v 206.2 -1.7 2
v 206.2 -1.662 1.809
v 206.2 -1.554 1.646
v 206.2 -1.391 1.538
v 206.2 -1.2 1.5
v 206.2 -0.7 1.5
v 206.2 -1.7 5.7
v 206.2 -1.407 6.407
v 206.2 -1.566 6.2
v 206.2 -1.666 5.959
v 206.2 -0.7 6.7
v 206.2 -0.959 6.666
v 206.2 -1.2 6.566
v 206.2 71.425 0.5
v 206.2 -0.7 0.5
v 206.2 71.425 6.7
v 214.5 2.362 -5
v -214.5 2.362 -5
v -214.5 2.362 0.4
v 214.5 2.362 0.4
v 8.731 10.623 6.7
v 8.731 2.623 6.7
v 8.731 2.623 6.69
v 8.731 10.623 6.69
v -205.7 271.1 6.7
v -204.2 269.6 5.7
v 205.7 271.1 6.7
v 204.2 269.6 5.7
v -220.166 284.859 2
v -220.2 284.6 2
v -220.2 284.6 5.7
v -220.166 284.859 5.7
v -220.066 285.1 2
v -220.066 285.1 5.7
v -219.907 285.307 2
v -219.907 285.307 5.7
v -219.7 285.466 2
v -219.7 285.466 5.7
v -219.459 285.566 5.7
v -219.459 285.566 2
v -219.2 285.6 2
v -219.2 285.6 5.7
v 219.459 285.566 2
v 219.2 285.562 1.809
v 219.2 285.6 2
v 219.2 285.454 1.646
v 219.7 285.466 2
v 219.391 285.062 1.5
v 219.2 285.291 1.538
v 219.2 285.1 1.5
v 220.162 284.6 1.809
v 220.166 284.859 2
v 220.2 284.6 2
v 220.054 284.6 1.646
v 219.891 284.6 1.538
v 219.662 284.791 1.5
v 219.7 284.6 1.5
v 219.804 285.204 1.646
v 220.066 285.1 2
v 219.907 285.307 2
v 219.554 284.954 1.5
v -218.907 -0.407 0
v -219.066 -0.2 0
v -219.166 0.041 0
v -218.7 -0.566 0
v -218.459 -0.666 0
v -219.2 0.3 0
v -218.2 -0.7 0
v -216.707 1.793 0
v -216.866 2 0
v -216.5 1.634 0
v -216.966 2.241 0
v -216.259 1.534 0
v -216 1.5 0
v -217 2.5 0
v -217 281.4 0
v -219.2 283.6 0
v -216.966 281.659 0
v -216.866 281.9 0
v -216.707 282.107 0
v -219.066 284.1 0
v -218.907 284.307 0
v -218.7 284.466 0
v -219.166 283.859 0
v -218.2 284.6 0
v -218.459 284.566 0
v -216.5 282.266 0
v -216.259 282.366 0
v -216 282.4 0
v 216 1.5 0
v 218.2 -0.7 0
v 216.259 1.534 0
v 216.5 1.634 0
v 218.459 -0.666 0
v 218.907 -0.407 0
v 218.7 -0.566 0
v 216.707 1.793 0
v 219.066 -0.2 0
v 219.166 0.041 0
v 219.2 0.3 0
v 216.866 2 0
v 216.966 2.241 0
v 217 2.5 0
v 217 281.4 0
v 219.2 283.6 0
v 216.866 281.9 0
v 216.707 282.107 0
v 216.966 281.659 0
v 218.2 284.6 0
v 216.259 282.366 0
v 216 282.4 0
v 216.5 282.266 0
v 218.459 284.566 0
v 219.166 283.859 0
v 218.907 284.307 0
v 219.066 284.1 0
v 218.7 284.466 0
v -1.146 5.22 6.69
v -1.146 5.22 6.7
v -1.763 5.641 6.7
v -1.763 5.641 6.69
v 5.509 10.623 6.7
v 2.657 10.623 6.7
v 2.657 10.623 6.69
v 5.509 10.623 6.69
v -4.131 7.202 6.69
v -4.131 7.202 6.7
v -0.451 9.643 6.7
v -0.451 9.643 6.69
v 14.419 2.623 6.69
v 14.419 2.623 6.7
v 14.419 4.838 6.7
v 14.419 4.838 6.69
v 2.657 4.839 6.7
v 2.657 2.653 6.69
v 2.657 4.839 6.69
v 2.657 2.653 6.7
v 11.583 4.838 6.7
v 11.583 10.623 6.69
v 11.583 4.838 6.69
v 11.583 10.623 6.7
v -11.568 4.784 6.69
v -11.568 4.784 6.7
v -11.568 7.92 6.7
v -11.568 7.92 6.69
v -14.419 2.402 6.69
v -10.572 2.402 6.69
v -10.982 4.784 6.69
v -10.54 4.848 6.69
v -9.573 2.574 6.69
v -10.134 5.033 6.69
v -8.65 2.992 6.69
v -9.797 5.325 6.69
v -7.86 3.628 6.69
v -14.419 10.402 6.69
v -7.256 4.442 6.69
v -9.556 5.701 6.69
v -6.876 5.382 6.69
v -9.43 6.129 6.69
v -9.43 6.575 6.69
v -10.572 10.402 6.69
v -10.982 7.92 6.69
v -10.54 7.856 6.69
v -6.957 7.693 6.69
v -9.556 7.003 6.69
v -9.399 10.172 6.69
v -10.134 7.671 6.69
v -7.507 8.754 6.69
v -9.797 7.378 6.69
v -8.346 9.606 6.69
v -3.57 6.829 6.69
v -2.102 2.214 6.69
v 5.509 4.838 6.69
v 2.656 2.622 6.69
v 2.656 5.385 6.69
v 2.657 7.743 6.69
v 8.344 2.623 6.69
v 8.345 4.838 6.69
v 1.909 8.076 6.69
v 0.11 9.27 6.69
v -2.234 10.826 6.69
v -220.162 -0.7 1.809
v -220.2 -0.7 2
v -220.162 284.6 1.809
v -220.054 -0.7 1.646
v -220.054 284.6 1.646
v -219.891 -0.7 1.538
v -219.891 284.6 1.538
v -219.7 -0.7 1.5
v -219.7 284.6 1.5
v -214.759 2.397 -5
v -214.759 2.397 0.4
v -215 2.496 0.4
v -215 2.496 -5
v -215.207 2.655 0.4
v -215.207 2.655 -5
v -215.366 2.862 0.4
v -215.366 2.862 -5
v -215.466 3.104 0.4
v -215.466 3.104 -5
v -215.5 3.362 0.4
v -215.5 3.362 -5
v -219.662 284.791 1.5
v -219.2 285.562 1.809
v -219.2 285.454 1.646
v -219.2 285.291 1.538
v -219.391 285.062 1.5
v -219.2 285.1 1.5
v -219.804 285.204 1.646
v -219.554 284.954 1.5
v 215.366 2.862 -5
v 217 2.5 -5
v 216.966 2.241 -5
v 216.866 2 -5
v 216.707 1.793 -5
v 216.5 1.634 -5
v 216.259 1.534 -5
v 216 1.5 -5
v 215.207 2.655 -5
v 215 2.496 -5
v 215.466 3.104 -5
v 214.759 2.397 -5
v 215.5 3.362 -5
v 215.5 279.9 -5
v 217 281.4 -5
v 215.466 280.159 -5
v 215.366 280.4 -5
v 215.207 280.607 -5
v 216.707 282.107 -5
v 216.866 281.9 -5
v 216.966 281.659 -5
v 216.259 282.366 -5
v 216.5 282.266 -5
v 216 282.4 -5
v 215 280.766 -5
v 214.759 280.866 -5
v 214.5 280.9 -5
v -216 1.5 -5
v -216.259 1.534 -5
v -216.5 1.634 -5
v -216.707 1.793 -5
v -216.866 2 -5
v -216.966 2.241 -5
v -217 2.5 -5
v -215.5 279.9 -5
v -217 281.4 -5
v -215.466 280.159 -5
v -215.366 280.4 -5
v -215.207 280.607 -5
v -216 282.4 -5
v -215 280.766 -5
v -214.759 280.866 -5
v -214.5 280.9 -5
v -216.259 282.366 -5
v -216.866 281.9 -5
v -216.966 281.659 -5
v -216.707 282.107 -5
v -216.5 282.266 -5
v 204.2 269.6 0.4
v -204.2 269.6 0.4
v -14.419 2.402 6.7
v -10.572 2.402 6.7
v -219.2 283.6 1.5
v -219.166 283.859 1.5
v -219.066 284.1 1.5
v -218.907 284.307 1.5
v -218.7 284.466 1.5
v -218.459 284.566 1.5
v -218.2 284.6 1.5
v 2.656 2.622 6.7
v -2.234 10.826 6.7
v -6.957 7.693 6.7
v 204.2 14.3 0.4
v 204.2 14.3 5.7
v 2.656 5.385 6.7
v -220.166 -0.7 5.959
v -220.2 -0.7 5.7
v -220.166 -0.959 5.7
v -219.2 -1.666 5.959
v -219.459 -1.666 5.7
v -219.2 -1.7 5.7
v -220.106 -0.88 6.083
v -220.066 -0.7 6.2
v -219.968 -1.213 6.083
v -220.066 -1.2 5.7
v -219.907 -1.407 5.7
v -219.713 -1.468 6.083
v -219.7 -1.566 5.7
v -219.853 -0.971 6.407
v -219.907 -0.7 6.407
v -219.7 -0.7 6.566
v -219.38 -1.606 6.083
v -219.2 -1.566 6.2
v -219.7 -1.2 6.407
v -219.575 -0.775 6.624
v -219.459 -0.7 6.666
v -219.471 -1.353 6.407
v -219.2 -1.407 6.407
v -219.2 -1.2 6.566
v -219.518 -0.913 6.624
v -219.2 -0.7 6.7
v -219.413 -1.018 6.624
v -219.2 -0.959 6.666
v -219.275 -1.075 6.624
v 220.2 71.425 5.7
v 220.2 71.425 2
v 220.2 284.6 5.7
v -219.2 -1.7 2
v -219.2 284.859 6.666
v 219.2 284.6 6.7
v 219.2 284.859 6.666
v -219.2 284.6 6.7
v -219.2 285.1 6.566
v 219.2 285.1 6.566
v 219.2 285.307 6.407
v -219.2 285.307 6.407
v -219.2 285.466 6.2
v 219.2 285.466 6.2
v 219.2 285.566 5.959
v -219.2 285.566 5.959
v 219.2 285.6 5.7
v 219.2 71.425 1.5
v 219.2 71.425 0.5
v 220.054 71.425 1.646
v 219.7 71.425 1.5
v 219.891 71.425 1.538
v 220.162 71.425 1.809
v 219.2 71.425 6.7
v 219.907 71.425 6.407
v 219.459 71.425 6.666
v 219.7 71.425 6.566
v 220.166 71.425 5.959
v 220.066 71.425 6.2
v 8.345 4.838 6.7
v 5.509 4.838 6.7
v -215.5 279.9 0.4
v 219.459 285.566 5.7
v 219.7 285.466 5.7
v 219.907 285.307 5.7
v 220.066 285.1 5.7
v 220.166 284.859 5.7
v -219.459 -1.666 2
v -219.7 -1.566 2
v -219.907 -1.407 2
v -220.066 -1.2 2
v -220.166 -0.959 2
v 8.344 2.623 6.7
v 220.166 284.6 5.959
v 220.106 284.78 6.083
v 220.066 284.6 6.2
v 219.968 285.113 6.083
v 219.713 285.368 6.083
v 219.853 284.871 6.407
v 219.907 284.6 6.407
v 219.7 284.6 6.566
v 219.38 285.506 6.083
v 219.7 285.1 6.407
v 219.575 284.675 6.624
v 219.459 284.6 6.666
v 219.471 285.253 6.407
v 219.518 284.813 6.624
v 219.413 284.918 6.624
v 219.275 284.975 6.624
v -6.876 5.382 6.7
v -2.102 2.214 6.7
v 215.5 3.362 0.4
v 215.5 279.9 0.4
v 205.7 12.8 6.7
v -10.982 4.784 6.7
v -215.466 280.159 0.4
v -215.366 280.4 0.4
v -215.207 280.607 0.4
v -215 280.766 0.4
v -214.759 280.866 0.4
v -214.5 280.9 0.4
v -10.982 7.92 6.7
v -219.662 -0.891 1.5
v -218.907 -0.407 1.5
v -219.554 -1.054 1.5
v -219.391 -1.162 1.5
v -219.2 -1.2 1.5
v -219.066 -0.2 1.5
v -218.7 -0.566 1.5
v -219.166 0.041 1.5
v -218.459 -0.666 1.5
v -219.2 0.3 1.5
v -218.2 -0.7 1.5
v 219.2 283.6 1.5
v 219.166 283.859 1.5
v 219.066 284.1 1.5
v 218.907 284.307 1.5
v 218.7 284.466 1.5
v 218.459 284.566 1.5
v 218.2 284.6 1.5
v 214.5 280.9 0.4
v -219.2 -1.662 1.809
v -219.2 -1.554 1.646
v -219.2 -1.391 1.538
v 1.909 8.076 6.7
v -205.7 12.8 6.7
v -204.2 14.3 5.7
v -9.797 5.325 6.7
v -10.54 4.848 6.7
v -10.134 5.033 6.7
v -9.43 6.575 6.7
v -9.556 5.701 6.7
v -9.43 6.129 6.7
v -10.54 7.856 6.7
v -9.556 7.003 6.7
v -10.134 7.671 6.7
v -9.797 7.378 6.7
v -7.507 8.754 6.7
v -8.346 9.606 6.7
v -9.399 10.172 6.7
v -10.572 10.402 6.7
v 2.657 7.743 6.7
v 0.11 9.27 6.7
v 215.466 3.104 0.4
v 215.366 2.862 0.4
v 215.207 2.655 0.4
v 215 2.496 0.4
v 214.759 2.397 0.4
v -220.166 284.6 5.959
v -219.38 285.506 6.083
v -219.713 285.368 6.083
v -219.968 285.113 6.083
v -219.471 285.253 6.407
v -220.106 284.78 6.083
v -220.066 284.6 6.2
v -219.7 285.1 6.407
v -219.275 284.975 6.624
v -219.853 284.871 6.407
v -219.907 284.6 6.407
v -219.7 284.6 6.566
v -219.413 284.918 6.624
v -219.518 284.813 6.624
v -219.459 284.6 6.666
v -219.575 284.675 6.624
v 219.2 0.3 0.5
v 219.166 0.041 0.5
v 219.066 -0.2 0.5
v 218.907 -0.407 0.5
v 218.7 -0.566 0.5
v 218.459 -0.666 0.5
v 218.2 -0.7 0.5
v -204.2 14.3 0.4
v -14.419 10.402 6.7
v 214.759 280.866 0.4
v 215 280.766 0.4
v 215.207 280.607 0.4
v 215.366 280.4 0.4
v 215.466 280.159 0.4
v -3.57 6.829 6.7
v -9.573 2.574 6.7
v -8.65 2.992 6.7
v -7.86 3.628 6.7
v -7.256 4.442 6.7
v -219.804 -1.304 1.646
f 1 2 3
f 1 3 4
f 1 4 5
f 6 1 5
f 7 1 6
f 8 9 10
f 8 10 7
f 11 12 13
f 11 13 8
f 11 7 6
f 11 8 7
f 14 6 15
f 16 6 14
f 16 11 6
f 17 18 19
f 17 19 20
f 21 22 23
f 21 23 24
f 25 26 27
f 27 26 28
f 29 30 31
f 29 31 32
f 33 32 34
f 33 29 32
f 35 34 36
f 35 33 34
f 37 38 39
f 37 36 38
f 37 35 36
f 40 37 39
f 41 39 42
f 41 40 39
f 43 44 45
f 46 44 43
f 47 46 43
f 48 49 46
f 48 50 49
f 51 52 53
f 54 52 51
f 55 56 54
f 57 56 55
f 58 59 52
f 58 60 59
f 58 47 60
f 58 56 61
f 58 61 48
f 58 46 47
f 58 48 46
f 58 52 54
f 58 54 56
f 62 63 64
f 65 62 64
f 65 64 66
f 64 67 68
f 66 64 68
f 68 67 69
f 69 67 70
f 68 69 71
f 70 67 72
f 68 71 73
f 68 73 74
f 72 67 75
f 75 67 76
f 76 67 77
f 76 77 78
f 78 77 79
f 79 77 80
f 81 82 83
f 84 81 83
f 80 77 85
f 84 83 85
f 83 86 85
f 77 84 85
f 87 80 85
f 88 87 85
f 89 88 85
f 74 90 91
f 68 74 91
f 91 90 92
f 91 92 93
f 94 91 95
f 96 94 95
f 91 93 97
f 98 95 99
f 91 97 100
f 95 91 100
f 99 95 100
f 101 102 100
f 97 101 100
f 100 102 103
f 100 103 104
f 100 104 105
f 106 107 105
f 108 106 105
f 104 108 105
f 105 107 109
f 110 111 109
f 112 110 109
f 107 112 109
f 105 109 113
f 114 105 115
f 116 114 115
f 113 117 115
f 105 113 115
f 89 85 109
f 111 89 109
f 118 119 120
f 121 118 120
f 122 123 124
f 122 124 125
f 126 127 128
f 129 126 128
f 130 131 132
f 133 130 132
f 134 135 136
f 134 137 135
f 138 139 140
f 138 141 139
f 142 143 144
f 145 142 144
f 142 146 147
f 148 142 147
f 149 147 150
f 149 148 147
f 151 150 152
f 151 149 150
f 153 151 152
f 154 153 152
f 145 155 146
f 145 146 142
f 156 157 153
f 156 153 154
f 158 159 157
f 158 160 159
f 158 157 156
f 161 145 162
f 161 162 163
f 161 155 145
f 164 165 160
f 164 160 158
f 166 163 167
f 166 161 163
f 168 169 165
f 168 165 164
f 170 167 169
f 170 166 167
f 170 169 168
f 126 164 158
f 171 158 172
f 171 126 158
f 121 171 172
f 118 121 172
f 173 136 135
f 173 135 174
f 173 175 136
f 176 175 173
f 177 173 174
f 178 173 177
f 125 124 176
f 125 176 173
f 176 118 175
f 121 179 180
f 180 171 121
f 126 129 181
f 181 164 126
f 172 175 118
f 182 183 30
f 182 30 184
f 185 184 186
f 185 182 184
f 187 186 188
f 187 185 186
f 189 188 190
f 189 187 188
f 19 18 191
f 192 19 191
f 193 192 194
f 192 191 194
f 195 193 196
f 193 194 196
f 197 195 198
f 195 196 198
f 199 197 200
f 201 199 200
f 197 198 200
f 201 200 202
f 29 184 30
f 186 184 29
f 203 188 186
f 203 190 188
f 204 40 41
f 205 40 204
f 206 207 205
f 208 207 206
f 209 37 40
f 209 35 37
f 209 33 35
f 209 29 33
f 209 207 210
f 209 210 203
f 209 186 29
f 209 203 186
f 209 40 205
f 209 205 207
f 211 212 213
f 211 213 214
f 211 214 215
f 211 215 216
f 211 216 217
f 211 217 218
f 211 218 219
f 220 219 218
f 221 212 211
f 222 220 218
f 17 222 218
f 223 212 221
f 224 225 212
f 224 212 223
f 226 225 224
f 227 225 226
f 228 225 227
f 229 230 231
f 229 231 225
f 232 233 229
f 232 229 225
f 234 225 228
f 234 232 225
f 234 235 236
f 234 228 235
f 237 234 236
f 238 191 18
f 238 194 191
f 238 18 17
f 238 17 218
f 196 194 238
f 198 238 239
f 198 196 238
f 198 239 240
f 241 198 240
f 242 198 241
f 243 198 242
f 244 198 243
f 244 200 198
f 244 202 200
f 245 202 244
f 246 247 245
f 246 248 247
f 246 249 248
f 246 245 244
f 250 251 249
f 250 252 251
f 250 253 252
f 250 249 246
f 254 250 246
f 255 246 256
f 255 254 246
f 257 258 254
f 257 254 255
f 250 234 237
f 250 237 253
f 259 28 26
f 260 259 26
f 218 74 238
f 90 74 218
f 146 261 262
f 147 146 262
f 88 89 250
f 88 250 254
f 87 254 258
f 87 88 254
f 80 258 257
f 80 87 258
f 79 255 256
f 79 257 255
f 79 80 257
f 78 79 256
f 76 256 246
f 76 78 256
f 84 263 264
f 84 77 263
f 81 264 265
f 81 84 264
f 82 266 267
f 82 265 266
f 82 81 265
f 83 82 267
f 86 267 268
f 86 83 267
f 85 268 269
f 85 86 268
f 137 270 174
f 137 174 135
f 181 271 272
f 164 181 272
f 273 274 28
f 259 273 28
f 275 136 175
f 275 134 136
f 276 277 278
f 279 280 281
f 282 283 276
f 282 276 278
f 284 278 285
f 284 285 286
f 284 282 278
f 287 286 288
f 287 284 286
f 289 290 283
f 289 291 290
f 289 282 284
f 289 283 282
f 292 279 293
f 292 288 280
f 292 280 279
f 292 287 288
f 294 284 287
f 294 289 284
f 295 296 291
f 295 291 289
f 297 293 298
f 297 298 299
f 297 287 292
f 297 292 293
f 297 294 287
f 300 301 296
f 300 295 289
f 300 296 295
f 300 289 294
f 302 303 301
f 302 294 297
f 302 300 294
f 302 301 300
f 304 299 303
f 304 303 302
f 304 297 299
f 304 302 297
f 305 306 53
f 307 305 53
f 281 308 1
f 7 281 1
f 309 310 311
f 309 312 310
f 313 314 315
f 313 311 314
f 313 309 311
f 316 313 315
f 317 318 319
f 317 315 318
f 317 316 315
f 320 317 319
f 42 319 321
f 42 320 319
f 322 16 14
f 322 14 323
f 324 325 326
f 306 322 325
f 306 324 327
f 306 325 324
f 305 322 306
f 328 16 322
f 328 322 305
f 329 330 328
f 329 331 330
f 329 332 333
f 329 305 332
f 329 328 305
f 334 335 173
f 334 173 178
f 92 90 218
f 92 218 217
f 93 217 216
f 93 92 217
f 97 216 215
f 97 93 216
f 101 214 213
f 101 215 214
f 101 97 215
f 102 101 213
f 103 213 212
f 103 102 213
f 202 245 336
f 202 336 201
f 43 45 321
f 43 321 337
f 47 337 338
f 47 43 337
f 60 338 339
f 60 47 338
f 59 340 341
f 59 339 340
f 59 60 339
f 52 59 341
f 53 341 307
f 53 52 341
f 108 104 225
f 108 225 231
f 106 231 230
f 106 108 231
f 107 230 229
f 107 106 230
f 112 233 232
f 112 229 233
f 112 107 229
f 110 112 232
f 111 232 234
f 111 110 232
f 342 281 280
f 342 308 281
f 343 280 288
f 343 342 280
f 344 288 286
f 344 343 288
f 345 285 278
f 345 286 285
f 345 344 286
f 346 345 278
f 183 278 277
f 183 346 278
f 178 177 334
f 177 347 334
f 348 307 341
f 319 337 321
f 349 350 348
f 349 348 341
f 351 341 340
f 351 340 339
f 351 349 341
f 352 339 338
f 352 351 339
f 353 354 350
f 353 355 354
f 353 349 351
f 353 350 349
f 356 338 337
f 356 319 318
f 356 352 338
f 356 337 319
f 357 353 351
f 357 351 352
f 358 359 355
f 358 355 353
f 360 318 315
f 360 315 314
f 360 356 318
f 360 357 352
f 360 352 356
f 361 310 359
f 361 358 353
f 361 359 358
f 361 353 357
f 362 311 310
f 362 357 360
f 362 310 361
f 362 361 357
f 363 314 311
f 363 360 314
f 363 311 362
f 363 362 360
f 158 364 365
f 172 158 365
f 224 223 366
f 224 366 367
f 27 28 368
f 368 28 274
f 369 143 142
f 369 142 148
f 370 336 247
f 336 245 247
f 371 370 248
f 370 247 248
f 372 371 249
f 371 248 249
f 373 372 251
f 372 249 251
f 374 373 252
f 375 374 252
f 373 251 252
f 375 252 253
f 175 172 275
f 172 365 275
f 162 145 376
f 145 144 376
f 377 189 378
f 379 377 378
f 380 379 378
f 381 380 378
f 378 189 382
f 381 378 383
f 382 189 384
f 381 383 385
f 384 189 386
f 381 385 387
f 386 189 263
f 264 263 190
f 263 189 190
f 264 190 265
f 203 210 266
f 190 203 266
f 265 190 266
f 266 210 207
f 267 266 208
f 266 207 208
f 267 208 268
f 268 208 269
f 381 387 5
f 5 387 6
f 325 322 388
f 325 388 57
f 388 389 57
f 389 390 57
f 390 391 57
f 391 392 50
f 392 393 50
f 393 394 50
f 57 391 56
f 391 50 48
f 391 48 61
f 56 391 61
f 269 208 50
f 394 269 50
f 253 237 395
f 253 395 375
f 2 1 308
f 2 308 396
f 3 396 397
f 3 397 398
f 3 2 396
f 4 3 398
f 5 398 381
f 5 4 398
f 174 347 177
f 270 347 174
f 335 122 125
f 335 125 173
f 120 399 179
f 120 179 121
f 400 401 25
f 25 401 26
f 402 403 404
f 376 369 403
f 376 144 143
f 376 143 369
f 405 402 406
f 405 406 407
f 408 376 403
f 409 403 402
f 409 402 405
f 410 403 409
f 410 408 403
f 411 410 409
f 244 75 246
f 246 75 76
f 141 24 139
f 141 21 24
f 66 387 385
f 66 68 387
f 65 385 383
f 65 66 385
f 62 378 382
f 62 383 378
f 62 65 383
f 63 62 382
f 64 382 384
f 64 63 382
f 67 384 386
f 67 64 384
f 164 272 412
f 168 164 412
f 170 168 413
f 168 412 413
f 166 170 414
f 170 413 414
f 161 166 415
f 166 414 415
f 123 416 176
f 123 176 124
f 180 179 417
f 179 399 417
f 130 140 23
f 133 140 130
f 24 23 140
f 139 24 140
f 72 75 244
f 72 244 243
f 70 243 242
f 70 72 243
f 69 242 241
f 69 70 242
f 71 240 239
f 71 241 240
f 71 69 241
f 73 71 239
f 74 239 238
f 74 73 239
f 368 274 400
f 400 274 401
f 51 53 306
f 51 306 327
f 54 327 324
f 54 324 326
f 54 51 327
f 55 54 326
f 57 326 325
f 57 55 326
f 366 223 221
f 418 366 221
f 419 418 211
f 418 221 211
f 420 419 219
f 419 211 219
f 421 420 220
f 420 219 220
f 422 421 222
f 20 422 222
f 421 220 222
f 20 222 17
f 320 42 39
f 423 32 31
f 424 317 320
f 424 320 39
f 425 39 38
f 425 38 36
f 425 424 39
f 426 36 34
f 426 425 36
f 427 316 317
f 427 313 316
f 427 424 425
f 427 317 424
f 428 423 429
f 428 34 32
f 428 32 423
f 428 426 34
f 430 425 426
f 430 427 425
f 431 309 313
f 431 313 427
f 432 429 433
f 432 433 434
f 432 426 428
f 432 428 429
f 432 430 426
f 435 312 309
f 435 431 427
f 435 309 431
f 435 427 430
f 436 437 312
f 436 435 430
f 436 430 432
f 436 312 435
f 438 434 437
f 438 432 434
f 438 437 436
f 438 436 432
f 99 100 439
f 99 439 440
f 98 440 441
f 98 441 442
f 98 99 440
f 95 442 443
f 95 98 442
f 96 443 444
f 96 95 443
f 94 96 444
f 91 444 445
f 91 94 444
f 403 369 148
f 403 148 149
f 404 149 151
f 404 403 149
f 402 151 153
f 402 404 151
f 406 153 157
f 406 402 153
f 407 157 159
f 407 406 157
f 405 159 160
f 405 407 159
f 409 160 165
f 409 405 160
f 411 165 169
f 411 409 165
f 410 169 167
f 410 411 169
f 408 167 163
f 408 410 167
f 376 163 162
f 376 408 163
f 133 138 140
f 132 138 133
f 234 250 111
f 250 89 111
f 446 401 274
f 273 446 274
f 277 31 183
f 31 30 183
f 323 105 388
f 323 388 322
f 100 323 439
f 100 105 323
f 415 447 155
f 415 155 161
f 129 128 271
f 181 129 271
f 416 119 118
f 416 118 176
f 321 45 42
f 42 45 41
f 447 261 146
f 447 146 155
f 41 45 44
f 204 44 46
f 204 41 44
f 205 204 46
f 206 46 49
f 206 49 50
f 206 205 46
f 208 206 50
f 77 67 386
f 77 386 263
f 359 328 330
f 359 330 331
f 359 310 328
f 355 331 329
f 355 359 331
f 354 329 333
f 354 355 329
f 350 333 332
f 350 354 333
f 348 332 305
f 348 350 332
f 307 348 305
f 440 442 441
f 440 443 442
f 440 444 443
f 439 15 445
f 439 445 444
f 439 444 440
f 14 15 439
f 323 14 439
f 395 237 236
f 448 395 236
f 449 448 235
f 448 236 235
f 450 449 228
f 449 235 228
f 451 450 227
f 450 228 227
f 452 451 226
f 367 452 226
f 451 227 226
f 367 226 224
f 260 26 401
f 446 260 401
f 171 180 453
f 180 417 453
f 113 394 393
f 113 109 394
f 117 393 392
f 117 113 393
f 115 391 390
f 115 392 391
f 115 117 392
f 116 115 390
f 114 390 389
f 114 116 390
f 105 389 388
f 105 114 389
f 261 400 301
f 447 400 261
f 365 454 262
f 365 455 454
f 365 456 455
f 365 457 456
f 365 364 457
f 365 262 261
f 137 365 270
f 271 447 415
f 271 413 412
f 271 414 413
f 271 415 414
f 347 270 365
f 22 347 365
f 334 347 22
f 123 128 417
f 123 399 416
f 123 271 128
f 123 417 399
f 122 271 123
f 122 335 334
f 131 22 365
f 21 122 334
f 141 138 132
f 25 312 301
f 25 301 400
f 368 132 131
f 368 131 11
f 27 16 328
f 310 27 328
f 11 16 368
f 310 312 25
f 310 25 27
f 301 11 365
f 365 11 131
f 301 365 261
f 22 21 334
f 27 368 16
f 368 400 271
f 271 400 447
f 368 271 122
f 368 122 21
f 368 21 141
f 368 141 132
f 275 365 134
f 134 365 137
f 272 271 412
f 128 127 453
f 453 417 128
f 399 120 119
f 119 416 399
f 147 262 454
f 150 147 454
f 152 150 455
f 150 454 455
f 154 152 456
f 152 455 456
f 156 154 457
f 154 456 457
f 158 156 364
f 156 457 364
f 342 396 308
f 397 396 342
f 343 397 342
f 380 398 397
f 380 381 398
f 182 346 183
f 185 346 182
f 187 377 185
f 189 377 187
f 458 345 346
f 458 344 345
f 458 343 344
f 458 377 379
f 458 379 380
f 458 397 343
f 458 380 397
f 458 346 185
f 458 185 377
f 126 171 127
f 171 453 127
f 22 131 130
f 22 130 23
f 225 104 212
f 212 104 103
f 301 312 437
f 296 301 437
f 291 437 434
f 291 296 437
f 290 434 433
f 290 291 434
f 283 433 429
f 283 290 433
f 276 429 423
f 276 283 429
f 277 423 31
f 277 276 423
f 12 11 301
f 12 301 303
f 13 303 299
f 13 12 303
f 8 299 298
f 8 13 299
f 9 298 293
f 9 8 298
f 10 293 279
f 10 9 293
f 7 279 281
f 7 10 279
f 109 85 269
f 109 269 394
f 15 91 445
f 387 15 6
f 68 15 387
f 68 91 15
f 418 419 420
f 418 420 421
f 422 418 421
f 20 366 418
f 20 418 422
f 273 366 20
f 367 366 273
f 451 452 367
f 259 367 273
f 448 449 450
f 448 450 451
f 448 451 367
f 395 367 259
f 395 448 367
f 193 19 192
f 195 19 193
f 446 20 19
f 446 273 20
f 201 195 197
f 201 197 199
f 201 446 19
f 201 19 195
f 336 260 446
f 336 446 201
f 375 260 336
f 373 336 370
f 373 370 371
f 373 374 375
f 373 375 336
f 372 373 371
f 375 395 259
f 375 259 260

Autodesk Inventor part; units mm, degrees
ref_plane "YZ Plane" through (0, 0, 0) normal (1, 0, 0) x (0, 1, 0)
ref_plane "XZ Plane" through (0, 0, 0) normal (0, 1, 0) x (-1, 0, 0)
ref_plane "XY Plane" through (0, 0, 0) normal (0, 0, 1) x (1, 0, 0)
sketch "Szkic1" plane through (0, 0, 0) normal (0, 0, 1) x (1, 0, 0)
  line L0 (-218.2, 284.6) -> (218.2, 284.6)
  line L1 (219.2, 283.6) -> (219.2, 0.3)
  line L2 (218.2, -0.7) -> (-218.2, -0.7)
  line L3 (-219.2, 0.3) -> (-219.2, 283.6)
  arc A0 (219.2, 283.6) -> (218.2, 284.6) centre (218.2, 283.6) ccw
  arc A1 (-218.2, 284.6) -> (-219.2, 283.6) centre (-218.2, 283.6) ccw
  arc A2 (-219.2, 0.3) -> (-218.2, -0.7) centre (-218.2, 0.3) ccw
  arc A3 (218.2, -0.7) -> (219.2, 0.3) centre (218.2, 0.3) ccw
  line L4 (214.5, 280.9) -> (-214.5, 280.9)
  line L5 (-215.5, 279.9) -> (-215.5, 3.3625)
  line L6 (-214.5, 2.3625) -> (214.5, 2.3625)
  line L7 (215.5, 3.3625) -> (215.5, 279.9)
  arc A4 (-214.5, 280.9) -> (-215.5, 279.9) centre (-214.5, 279.9) ccw
  arc A5 (215.5, 279.9) -> (214.5, 280.9) centre (214.5, 279.9) ccw
  arc A6 (214.5, 2.3625) -> (215.5, 3.3625) centre (214.5, 3.3625) ccw
  arc A7 (-215.5, 3.3625) -> (-214.5, 2.3625) centre (-214.5, 3.3625) ccw
  point P0 (0, 0)
  point P1 (219.2, 284.6)
  point P2 (-219.2, -0.7)
  point P3 (219.2, -0.7)
  dimension "d7" = 1
extrude "Wyciągnięcie proste1" add sketch "Szkic1" along normal blind 1.5
sketch "Szkic2" plane through (0, 0, 0) normal (0, 0, -1) x (-1, 0, 0)
  line L0 (217, 2.5) -> (217, 281.4)
  line L1 (216, 282.4) -> (-216, 282.4)
  line L2 (-217, 281.4) -> (-217, 2.5)
  line L3 (-215.5, 3.3625) -> (-215.5, 279.9)
  arc A0 (-214.5, 280.9) -> (-215.5, 279.9) centre (-214.5, 279.9) ccw
  line L4 (-214.5, 280.9) -> (214.5, 280.9)
  arc A1 (215.5, 279.9) -> (214.5, 280.9) centre (214.5, 279.9) ccw
  line L5 (215.5, 279.9) -> (215.5, 3.3625)
  arc A2 (214.5, 2.3625) -> (215.5, 3.3625) centre (214.5, 3.3625) ccw
  line L6 (216, 1.5) -> (73, 1.5)
  line L7 (214.5, 2.3625) -> (-214.5, 2.3625)
  arc A3 (-215.5, 3.3625) -> (-214.5, 2.3625) centre (-214.5, 3.3625) ccw
  line L8 (-51.8, 1.5) -> (-216, 1.5)
  line L9 (-216, 282.4) -> (-215.9969, 282.4)
  line L10 (-39.9, 1.5) -> (-51.8, 1.5)
  line L11 (61.1, 1.5) -> (-39.9, 1.5)
  line L12 (73, 1.5) -> (61.1, 1.5)
  arc A4 (-216, 282.4) -> (-217, 281.4) centre (-216, 281.4) ccw
  arc A5 (217, 281.4) -> (216, 282.4) centre (216, 281.4) ccw
  arc A6 (216, 1.5) -> (217, 2.5) centre (216, 2.5) ccw
  arc A7 (-217, 2.5) -> (-216, 1.5) centre (-216, 2.5) ccw
  point P0 (0, 0)
  dimension "d10" = 1
  dimension "d11" = 1
  dimension "d12" = 1
  dimension "d13" = 1
extrude "Wyciągnięcie proste2" add sketch "Szkic2" along normal blind 5
sketch "Szkic3" plane through (0, 0, 1.5) normal (0, 0, 1) x (1, 0, 0)
  line L0 (-220.2, 284.6) -> (-220.2, -0.7) projected
  arc A0 (-220.2, -0.7) -> (-219.2, -1.7) centre (-219.2, -0.7) ccw
  line L1 (-219.2, -1.7) -> (219.2, -1.7) projected
  arc A1 (-219.2, 285.6) -> (-220.2, 284.6) centre (-219.2, 284.6) ccw
  line L2 (219.2, 285.6) -> (-219.2, 285.6) projected
  arc A2 (220.2, 284.6) -> (219.2, 285.6) centre (219.2, 284.6) ccw
  line L3 (220.2, -0.7) -> (220.2, 284.6) projected
  arc A3 (219.2, -1.7) -> (220.2, -0.7) centre (219.2, -0.7) ccw
  line L4 (-204.2, 269.6) -> (204.2, 269.6)
  line L5 (204.2, 269.6) -> (204.2, 14.3)
  line L6 (204.2, 14.3) -> (-204.2, 14.3)
  line L7 (-204.2, 14.3) -> (-204.2, 269.6)
  point P0 (0, 0)
extrude "Wyciągnięcie proste4" add sketch "Szkic3" along normal blind 5.2
fillet "Zaokrąglenie2" radius 0.5 8 edges at (-219.9071, 285.3071, 1.5) (-220.2, 141.95, 1.5) (-219.9071, -1.4071, 1.5) (0, -1.7, 1.5) (219.9071, -1.4071, 1.5) (220.2, 141.95, 1.5) (219.9071, 285.3071, 1.5) (0, 285.6, 1.5)
fillet "Zaokrąglenie3" radius 1 8 edges at (-219.9071, 285.3071, 6.7) (-220.2, 141.95, 6.7) (-219.9071, -1.4071, 6.7) (0, -1.7, 6.7) (219.9071, -1.4071, 6.7) (220.2, 141.95, 6.7) (219.9071, 285.3071, 6.7) (0, 285.6, 6.7)
sketch "Szkic4" plane through (0, 0, 1.5) normal (0, 0, -1) x (-1, 0, 0)
  line L0 (-215.5, 3.3625) -> (-215.5, 279.9) projected
  arc A0 (-214.5, 280.9) -> (-215.5, 279.9) centre (-214.5, 279.9) ccw projected
  line L1 (-204.2, 14.3) -> (-204.2, 269.6) projected
  line L2 (-204.2, 269.6) -> (204.2, 269.6) projected
  line L3 (-214.5, 280.9) -> (214.5, 280.9) projected
  line L4 (204.2, 269.6) -> (204.2, 14.3) projected
  arc A1 (215.5, 279.9) -> (214.5, 280.9) centre (214.5, 279.9) ccw projected
  line L5 (215.5, 279.9) -> (215.5, 3.3625) projected
  line L6 (204.2, 14.3) -> (-204.2, 14.3) projected
  line L7 (214.5, 2.3625) -> (-214.5, 2.3625) projected
  arc A2 (214.5, 2.3625) -> (215.5, 3.3625) centre (214.5, 3.3625) ccw projected
  arc A3 (-215.5, 3.3625) -> (-214.5, 2.3625) centre (-214.5, 3.3625) ccw projected
  point P0 (0, 0)
extrude "Wyciągnięcie proste5" add sketch "Szkic4" along normal blind 1.1
chamfer "Faza1" distance 1.5 distance2 1 1 edges at (-204.2, 141.95, 6.7) measured on face at (68.0667, 4.3, 6.7)
chamfer "Faza2" distance 1.5 distance2 1 1 edges at (0, 269.6, 6.7) measured on face at (68.0667, 4.3, 6.7)
chamfer "Faza3" distance 1.5 distance2 1 1 edges at (204.2, 141.95, 6.7) measured on face at (68.0667, 4.3, 6.7)
chamfer "Faza4" distance 1.5 distance2 1 1 edges at (0, 14.3, 6.7) measured on face at (68.0667, 4.3, 6.7)
sketch "Szkic5" plane through (0, 0, 6.7) normal (0, 0, 1) x (1, 0, 0)
  line L0 (219.2, -1.7) -> (206.2, -1.7)
  line L1 (206.2, -1.7) -> (206.45, -1.7)
  line L2 (206.2, 71.425) -> (220.2, 71.425)
  line L3 (220.2, 71.425) -> (220.2, -0.7)
  arc A0 (219.2, -1.7) -> (220.2, -0.7) centre (219.2, -0.7) ccw
  line L4 (206.2, -1.7) -> (206.2, 71.425)
extrude "Wyciągnięcie proste6" cut sketch "Szkic5" against normal blind 6.2
sketch "Szkic6" plane through (0, 0, 6.7) normal (0, 0, 1) x (1, 0, 0)
  line L0 (2.6567, 2.6528) -> (2.657, 4.8393)
  line L1 (-6.8758, 5.3818) -> (-2.1024, 2.2136)
  line L2 (-2.2336, 10.8259) -> (-6.9572, 7.6927)
  line L3 (-2.1024, 2.2136) -> (2.6564, 5.385)
  line L4 (14.4188, 2.6234) -> (14.4191, 4.8375)
  line L5 (1.9087, 8.0765) -> (-1.7626, 5.6414)
  line L6 (1.9087, 8.0765) -> (0.1103, 9.2702)
  line L7 (0.1103, 9.2702) -> (-3.5698, 6.8293)
  line L8 (-3.5698, 6.8293) -> (-4.1314, 7.2021)
  line L9 (-4.1314, 7.2021) -> (-0.4514, 9.643)
  line L10 (-0.4514, 9.643) -> (-2.2336, 10.8259)
  line L11 (14.4188, 2.6234) -> (14.4188, 2.652)
  line L12 (2.6564, 2.6222) -> (2.6564, 5.385)
  line L13 (8.7309, 2.6234) -> (8.7309, 10.6234)
  line L14 (8.7309, 10.6234) -> (11.5831, 10.6234)
  line L15 (8.7309, 10.6234) -> (11.5831, 10.6234)
  line L16 (11.5831, 10.6234) -> (11.5831, 4.8379)
  line L17 (11.5831, 4.8379) -> (14.4191, 4.8375)
  line L18 (14.4188, 2.6234) -> (8.7309, 2.6234)
  line L19 (8.3444, 2.623) -> (2.6564, 2.623)
  line L20 (8.3444, 2.623) -> (8.3447, 4.8375)
  line L21 (5.5087, 4.8379) -> (8.3447, 4.8375)
  line L22 (5.5087, 10.6234) -> (5.5087, 4.8379)
  line L23 (2.6567, 10.6234) -> (5.5087, 10.6234)
  line L24 (2.8855, 10.652) -> (2.5712, 10.652)
  line L25 (2.6564, 2.623) -> (2.6564, 5.385)
  line L26 (2.6567, 7.7426) -> (2.6567, 10.6234)
  line L27 (-14.4194, 2.4022) -> (-14.4194, 10.4022)
  line L28 (-14.4194, 10.4022) -> (-10.5724, 10.4022)
  line L29 (-14.4194, 10.4022) -> (-10.5724, 10.4022)
  line L30 (-14.4194, 2.4022) -> (-10.5724, 2.4022)
  arc A0 (-10.5724, 2.4022) -> (-6.8758, 5.3818) centre (-10.7474, 6.4022) ccw
  arc A1 (-6.9572, 7.6927) -> (-10.5724, 10.4022) centre (-10.7474, 6.4022) ccw
  line L31 (-11.568, 4.7844) -> (-11.568, 7.9195)
  line L32 (-11.568, 7.9195) -> (-10.9818, 7.9195)
  arc A2 (-10.9818, 4.7844) -> (-10.9818, 7.9195) centre (-10.9818, 6.352) ccw
  line L33 (-7.0718, 7.99) -> (-7.0718, 7.9899)
  line L34 (-1.1458, 5.2204) -> (-1.7626, 5.6414)
  line L35 (-1.1458, 5.2204) -> (2.6567, 7.7426)
  line L36 (-11.568, 4.7844) -> (-10.9818, 4.7844)
extrude "Wyciągnięcie proste7" cut sketch "Szkic6" against normal blind 0.01
properties part number "OBUDOWA PRZEDNIA" material "Tworzywo sztuczne, nieprzezroczyste czarne"
